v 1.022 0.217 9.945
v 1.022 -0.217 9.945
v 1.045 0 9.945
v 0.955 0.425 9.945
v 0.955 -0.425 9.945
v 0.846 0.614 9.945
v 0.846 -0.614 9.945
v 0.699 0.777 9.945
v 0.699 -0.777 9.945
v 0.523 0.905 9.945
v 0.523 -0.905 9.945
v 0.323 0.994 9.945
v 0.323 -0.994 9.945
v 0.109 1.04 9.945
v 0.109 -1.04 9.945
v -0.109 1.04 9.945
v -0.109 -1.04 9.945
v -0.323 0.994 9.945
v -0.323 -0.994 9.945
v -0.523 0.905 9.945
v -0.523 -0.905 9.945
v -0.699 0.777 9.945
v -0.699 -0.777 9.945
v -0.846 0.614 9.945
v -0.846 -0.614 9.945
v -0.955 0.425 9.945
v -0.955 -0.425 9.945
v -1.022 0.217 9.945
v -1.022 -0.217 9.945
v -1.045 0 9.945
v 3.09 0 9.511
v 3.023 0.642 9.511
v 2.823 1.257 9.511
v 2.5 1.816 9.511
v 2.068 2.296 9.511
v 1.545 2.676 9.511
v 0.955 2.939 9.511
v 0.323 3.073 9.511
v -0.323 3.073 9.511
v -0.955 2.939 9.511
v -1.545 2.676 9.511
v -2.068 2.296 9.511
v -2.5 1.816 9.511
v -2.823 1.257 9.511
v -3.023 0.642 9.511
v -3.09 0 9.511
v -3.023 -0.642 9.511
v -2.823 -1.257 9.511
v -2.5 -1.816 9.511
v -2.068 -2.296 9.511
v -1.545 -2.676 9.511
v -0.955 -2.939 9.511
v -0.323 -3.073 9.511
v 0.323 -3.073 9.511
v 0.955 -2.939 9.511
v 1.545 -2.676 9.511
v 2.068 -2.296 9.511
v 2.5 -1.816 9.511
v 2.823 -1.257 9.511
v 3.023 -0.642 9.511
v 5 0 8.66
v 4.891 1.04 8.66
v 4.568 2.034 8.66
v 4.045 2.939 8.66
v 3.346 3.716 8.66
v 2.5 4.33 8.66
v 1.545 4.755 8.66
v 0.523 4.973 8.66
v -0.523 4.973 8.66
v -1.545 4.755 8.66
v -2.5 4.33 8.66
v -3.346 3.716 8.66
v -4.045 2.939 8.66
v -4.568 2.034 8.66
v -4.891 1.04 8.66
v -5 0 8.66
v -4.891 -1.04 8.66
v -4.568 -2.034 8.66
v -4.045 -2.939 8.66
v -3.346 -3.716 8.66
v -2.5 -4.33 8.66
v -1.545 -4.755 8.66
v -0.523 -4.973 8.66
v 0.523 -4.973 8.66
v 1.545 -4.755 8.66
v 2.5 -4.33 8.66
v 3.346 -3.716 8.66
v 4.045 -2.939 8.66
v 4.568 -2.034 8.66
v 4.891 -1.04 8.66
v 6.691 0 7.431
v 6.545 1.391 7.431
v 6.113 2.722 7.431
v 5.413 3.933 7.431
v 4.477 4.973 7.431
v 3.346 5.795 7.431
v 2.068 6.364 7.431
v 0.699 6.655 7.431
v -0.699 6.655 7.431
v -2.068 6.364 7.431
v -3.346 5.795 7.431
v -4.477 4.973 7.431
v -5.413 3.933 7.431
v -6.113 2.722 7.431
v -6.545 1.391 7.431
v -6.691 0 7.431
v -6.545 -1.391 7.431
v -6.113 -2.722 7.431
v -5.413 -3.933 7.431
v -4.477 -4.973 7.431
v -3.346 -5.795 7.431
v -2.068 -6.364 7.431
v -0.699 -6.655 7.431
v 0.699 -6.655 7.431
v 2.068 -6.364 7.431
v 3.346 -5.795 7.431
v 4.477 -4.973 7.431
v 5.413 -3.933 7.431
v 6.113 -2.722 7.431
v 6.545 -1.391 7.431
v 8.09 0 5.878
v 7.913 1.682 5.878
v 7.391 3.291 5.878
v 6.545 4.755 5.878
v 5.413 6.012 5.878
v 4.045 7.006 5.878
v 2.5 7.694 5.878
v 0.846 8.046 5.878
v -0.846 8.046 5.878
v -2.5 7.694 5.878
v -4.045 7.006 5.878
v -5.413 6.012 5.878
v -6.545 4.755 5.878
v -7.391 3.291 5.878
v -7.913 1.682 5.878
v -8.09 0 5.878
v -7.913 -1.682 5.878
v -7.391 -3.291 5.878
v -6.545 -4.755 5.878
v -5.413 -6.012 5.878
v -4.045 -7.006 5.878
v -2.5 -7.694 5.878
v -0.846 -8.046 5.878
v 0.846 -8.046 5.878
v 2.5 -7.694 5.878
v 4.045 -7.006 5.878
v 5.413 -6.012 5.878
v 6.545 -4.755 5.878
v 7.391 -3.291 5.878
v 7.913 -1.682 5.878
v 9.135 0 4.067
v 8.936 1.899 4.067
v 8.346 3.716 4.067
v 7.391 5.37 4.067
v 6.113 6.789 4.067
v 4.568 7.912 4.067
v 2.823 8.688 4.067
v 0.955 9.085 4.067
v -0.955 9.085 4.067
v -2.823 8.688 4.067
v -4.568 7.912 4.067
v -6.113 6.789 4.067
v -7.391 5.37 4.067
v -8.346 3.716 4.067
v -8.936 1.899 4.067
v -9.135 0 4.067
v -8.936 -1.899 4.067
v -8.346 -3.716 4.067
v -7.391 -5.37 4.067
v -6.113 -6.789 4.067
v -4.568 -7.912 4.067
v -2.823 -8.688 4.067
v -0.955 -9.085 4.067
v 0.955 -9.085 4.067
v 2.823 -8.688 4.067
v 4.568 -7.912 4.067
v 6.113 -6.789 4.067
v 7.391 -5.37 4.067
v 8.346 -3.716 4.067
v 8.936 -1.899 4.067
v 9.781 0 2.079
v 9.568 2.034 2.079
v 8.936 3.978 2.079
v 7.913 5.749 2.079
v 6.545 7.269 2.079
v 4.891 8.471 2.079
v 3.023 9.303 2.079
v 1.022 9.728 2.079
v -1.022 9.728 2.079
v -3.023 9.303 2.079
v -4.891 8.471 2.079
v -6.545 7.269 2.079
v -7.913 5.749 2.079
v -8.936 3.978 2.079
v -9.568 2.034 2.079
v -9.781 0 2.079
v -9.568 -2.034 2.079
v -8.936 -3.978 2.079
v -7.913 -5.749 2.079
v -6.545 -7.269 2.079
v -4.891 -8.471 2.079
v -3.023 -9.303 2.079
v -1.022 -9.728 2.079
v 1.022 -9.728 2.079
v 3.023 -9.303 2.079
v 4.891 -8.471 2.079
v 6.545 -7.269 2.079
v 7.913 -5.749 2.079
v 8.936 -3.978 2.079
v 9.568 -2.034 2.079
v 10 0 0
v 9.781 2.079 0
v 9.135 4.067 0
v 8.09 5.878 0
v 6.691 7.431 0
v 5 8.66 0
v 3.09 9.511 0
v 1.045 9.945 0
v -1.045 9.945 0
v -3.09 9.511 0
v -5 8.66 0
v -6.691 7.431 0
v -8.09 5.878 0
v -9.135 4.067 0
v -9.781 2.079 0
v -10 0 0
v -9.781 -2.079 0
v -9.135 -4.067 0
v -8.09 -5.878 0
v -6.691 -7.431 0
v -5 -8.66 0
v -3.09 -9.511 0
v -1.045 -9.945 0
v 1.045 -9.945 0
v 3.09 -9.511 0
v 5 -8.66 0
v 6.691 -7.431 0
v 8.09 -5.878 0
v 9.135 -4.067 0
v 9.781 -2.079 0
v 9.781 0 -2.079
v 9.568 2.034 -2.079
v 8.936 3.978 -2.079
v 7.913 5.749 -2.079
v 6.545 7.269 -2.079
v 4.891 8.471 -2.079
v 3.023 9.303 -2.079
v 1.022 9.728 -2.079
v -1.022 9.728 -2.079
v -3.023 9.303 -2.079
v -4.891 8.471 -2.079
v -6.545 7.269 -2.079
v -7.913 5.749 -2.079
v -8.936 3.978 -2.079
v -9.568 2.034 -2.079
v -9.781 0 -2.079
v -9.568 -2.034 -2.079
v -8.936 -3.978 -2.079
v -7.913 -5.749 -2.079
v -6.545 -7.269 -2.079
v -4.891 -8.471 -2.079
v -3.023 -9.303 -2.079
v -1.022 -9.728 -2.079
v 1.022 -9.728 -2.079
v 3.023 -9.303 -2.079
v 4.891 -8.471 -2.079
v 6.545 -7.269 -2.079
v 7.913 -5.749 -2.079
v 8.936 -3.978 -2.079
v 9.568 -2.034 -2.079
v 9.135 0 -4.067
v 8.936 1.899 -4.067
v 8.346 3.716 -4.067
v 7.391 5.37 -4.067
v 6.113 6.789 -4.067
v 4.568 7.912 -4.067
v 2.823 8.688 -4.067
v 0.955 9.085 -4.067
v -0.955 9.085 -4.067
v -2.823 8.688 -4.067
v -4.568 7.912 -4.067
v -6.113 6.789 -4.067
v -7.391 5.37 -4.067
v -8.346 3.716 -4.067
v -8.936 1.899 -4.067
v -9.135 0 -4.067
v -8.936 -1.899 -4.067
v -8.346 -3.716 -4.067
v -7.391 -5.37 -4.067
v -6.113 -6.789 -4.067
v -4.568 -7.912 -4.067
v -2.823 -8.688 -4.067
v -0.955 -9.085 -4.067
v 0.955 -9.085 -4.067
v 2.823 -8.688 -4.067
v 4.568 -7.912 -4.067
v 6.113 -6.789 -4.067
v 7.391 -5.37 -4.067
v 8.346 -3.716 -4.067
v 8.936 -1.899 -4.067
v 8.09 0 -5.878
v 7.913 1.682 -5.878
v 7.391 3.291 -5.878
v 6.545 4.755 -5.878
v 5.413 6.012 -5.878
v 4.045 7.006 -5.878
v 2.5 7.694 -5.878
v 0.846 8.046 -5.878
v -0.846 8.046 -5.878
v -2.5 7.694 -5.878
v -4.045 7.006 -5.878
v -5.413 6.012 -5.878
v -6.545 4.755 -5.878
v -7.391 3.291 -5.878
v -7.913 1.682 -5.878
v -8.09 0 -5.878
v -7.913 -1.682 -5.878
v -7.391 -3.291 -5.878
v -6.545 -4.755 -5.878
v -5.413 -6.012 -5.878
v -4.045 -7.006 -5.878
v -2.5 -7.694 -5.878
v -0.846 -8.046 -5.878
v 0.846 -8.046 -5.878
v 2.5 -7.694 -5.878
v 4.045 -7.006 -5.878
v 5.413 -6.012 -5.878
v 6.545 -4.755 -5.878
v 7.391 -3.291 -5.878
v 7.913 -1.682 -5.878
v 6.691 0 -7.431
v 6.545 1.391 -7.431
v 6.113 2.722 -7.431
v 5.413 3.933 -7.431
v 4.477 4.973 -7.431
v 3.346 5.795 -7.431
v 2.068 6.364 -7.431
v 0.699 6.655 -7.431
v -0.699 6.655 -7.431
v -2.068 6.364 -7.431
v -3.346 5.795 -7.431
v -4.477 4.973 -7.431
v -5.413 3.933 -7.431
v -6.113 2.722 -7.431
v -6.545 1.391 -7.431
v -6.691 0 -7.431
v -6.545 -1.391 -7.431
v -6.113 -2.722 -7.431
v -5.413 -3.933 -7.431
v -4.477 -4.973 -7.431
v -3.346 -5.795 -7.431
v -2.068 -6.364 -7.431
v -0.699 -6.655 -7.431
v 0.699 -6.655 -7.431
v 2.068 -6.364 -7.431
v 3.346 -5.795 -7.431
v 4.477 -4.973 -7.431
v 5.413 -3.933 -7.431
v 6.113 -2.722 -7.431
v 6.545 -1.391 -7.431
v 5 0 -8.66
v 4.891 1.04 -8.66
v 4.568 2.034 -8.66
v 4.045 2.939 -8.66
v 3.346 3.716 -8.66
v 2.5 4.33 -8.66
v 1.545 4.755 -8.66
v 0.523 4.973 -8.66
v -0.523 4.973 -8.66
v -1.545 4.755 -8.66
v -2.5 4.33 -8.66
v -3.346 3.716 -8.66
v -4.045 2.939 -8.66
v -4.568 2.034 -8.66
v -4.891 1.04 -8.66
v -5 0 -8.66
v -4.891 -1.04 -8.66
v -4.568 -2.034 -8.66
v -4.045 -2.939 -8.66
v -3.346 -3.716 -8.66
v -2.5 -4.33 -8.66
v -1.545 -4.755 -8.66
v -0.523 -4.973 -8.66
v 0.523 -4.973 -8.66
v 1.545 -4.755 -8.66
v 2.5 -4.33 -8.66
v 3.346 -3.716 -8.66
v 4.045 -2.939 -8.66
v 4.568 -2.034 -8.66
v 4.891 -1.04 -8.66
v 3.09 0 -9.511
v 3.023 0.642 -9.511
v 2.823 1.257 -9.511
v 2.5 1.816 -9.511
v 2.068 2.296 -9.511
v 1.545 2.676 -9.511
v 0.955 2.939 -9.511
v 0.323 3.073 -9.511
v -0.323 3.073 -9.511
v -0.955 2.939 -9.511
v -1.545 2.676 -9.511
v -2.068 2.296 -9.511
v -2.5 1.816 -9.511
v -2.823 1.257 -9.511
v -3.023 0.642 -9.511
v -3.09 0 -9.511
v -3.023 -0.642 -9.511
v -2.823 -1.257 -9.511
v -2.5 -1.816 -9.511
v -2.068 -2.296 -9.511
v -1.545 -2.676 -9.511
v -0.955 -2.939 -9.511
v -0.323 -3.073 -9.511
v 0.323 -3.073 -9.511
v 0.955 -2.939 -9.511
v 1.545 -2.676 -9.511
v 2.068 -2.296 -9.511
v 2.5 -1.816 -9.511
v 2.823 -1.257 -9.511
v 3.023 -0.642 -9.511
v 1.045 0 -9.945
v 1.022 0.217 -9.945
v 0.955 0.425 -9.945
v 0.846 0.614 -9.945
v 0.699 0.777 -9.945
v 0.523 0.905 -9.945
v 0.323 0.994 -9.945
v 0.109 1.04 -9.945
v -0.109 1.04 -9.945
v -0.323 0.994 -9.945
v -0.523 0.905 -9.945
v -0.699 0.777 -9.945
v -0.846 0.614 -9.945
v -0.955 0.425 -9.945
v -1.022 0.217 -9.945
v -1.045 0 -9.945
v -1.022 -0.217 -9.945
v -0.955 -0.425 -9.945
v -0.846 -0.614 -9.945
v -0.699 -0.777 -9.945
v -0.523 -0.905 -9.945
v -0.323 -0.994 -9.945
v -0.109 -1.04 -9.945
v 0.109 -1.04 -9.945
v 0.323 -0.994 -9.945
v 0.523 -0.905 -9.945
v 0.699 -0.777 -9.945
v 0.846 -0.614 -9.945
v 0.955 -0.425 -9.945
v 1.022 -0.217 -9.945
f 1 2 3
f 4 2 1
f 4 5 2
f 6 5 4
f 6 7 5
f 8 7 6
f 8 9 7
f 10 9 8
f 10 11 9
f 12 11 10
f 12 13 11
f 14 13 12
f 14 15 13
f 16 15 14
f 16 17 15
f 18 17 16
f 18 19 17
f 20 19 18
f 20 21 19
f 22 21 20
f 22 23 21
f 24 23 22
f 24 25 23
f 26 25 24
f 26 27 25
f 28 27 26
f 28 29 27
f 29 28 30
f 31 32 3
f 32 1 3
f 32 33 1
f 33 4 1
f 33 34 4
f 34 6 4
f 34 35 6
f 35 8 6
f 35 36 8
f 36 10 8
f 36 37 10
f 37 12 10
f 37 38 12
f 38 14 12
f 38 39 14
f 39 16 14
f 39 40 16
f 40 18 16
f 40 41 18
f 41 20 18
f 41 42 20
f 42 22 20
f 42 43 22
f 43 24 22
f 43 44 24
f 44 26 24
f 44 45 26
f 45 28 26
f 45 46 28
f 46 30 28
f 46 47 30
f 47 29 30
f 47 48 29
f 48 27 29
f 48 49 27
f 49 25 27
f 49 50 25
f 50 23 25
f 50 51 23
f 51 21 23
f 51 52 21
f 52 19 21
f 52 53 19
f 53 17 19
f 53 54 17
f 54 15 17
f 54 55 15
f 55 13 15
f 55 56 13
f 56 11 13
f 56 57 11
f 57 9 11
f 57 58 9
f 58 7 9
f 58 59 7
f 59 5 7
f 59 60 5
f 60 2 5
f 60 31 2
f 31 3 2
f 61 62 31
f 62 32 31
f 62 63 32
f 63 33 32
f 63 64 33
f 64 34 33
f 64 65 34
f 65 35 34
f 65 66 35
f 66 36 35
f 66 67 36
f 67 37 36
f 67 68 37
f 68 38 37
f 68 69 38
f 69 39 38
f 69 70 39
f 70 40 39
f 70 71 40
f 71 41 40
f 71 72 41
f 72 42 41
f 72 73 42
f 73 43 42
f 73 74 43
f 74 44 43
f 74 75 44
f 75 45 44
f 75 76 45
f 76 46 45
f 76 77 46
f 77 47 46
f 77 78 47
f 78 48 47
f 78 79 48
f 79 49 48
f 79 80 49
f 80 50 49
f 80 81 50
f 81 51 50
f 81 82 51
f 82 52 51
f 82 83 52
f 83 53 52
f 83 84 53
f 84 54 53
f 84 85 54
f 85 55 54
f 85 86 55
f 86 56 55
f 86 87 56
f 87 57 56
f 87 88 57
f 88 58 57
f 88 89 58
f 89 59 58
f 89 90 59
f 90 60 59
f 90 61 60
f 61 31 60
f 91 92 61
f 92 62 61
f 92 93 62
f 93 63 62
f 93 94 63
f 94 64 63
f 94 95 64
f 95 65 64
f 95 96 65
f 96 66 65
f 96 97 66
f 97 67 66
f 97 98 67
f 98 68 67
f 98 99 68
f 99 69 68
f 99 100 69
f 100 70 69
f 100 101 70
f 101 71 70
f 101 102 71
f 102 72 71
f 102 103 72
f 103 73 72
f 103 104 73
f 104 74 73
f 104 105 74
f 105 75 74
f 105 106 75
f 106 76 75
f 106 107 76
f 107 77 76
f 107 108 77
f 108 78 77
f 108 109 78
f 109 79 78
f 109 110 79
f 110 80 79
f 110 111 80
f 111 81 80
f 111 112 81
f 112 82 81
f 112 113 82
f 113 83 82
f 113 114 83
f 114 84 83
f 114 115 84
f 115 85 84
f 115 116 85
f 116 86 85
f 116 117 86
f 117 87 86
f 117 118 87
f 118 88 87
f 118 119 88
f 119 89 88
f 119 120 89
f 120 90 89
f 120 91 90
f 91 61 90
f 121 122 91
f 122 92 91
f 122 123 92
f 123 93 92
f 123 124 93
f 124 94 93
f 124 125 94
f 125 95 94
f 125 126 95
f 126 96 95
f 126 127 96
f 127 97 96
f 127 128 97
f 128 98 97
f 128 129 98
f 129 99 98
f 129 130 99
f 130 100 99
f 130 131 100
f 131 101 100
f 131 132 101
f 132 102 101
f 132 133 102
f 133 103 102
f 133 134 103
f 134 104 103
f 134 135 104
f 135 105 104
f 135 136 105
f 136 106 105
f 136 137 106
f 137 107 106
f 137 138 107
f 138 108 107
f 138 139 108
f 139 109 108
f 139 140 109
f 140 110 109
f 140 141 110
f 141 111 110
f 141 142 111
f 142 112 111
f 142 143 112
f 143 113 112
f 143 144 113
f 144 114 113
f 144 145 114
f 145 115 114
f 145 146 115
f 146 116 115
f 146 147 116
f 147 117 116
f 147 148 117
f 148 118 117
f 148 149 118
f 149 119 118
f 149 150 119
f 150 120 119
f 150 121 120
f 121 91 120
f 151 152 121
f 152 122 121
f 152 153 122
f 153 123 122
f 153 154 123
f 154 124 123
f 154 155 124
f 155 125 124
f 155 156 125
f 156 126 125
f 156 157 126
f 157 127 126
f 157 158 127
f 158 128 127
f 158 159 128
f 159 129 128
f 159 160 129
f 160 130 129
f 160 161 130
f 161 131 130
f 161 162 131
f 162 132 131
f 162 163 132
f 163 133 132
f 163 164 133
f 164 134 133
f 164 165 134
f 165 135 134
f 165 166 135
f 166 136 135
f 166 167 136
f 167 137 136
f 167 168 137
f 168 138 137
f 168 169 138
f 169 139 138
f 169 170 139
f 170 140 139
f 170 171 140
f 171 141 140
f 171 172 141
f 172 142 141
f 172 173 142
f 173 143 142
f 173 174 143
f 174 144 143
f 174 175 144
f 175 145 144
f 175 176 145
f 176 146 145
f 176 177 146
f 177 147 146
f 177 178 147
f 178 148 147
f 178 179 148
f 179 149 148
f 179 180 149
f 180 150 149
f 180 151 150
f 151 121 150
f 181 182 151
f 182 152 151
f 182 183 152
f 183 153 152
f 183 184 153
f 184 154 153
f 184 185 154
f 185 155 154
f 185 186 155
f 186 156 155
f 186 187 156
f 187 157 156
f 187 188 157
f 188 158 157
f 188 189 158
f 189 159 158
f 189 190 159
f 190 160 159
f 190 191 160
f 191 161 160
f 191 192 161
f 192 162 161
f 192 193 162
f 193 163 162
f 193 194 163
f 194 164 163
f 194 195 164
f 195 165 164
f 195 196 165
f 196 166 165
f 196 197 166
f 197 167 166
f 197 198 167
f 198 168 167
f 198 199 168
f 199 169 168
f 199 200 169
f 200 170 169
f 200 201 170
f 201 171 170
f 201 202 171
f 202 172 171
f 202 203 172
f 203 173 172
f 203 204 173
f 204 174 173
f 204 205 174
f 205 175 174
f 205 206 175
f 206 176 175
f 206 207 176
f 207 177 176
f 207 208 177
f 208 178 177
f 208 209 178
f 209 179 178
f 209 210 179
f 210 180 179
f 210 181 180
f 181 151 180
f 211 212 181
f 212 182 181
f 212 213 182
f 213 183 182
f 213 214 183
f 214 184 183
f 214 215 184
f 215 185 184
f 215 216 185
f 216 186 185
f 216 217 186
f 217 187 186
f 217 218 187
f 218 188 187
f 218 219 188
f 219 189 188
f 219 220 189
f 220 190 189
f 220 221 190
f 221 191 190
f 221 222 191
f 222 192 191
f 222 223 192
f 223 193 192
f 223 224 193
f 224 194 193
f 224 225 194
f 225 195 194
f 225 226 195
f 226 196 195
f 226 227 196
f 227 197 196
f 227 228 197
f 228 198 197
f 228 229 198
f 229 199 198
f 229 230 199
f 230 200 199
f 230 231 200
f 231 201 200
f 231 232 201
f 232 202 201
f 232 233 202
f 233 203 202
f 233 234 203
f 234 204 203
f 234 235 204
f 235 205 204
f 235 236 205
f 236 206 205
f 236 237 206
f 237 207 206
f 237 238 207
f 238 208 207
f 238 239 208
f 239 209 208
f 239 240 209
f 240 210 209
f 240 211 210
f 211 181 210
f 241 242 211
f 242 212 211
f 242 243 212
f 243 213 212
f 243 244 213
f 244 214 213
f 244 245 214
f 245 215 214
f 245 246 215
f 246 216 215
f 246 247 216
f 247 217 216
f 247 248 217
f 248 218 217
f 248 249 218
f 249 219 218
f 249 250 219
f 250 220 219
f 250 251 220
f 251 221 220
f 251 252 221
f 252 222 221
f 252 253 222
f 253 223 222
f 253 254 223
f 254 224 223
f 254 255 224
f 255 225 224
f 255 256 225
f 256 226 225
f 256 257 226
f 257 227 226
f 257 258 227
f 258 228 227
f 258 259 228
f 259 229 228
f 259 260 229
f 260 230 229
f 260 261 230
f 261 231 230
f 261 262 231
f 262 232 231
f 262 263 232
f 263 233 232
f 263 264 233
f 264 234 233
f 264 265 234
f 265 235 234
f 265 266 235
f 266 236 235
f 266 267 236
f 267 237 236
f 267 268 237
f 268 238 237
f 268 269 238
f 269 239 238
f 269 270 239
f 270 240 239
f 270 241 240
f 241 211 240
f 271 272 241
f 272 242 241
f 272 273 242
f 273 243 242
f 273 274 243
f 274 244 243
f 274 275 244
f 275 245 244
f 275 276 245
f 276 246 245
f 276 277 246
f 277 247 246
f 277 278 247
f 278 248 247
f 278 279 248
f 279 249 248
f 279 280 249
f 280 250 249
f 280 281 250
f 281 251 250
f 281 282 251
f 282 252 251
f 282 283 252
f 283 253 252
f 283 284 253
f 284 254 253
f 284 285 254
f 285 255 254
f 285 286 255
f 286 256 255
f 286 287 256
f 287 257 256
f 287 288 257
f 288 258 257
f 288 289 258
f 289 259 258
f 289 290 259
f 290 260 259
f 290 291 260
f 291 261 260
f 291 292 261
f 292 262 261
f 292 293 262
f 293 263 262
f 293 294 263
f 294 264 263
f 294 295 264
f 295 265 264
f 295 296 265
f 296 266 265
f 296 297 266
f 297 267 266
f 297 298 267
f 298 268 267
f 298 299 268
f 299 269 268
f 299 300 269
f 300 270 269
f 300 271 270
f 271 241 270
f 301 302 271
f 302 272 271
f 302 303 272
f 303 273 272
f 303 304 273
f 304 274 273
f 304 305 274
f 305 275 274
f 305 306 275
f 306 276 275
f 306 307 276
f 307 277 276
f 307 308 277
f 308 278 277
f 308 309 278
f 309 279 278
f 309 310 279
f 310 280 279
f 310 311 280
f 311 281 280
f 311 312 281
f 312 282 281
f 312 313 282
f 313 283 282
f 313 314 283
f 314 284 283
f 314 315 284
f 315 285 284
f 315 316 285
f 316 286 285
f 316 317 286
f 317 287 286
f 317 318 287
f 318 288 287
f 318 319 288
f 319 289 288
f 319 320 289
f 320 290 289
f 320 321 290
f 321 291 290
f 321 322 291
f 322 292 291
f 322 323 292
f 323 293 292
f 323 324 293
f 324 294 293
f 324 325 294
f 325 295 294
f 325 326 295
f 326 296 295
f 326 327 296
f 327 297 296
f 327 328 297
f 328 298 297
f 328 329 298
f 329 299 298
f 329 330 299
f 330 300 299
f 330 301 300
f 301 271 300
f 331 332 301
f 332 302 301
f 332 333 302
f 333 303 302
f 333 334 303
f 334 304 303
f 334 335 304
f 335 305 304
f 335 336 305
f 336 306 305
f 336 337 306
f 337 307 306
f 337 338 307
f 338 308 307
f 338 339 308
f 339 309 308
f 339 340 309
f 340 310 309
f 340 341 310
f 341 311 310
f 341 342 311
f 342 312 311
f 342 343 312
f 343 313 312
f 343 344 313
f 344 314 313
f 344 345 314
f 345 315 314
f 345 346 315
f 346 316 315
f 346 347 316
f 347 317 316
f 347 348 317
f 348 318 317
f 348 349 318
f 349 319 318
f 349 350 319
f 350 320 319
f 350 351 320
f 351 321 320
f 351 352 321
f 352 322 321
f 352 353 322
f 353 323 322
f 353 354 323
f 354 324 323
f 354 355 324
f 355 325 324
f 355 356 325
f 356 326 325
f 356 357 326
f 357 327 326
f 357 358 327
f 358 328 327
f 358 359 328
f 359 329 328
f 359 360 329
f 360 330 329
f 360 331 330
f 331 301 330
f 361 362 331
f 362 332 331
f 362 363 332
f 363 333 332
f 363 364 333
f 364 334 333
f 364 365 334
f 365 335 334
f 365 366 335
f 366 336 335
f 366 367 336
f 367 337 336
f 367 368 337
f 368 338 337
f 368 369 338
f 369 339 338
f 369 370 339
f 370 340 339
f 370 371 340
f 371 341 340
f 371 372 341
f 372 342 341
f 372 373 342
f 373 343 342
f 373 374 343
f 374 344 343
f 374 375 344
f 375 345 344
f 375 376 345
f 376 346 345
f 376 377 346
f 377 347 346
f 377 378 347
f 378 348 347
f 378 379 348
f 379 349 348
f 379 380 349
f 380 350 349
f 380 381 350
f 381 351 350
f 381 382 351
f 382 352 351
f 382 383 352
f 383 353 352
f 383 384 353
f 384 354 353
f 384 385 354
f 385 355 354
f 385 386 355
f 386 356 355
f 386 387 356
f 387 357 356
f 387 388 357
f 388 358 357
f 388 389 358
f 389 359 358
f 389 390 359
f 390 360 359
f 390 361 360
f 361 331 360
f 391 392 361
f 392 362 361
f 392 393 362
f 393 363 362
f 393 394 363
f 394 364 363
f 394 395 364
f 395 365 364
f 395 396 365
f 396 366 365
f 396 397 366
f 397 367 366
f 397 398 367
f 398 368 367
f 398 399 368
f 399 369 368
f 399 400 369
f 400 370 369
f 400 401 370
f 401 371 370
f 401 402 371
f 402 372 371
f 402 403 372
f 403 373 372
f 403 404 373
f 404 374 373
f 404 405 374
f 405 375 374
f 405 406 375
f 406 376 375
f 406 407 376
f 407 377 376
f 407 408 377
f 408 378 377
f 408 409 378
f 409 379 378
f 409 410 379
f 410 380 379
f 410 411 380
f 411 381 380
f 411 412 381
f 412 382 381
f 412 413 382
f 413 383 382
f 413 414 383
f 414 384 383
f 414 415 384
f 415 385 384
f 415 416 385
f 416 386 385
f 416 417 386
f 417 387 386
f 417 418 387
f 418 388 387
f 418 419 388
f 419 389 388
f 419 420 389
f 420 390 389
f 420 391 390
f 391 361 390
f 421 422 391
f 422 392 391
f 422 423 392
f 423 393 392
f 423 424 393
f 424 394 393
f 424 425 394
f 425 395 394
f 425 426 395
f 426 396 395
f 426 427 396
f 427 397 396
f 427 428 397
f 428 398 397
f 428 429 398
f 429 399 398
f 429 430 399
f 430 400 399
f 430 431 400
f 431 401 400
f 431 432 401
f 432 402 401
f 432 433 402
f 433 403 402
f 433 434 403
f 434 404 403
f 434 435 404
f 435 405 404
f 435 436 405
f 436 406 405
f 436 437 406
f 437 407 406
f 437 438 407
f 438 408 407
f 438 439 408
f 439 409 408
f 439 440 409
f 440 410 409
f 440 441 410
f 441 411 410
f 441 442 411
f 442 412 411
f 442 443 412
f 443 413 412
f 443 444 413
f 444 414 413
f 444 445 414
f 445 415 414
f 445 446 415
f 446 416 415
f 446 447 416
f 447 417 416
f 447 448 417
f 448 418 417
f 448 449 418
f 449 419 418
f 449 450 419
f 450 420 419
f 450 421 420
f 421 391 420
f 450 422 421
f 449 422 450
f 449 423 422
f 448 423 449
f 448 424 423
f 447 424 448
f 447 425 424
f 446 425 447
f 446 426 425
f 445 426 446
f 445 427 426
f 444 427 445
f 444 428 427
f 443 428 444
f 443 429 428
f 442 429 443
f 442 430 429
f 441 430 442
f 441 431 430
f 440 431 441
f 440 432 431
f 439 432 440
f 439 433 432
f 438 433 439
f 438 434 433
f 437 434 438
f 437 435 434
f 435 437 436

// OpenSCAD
// [FL_INDEX: keywords="openscad, 3d_parametric, Customizable_Sphere, csg_solid" | COT="Parametric OpenSCAD design from 3DCodeverse"]
// Title: Customizable Sphere

sphere_radius = 10;//[1:100]
sphere(sphere_radius);
